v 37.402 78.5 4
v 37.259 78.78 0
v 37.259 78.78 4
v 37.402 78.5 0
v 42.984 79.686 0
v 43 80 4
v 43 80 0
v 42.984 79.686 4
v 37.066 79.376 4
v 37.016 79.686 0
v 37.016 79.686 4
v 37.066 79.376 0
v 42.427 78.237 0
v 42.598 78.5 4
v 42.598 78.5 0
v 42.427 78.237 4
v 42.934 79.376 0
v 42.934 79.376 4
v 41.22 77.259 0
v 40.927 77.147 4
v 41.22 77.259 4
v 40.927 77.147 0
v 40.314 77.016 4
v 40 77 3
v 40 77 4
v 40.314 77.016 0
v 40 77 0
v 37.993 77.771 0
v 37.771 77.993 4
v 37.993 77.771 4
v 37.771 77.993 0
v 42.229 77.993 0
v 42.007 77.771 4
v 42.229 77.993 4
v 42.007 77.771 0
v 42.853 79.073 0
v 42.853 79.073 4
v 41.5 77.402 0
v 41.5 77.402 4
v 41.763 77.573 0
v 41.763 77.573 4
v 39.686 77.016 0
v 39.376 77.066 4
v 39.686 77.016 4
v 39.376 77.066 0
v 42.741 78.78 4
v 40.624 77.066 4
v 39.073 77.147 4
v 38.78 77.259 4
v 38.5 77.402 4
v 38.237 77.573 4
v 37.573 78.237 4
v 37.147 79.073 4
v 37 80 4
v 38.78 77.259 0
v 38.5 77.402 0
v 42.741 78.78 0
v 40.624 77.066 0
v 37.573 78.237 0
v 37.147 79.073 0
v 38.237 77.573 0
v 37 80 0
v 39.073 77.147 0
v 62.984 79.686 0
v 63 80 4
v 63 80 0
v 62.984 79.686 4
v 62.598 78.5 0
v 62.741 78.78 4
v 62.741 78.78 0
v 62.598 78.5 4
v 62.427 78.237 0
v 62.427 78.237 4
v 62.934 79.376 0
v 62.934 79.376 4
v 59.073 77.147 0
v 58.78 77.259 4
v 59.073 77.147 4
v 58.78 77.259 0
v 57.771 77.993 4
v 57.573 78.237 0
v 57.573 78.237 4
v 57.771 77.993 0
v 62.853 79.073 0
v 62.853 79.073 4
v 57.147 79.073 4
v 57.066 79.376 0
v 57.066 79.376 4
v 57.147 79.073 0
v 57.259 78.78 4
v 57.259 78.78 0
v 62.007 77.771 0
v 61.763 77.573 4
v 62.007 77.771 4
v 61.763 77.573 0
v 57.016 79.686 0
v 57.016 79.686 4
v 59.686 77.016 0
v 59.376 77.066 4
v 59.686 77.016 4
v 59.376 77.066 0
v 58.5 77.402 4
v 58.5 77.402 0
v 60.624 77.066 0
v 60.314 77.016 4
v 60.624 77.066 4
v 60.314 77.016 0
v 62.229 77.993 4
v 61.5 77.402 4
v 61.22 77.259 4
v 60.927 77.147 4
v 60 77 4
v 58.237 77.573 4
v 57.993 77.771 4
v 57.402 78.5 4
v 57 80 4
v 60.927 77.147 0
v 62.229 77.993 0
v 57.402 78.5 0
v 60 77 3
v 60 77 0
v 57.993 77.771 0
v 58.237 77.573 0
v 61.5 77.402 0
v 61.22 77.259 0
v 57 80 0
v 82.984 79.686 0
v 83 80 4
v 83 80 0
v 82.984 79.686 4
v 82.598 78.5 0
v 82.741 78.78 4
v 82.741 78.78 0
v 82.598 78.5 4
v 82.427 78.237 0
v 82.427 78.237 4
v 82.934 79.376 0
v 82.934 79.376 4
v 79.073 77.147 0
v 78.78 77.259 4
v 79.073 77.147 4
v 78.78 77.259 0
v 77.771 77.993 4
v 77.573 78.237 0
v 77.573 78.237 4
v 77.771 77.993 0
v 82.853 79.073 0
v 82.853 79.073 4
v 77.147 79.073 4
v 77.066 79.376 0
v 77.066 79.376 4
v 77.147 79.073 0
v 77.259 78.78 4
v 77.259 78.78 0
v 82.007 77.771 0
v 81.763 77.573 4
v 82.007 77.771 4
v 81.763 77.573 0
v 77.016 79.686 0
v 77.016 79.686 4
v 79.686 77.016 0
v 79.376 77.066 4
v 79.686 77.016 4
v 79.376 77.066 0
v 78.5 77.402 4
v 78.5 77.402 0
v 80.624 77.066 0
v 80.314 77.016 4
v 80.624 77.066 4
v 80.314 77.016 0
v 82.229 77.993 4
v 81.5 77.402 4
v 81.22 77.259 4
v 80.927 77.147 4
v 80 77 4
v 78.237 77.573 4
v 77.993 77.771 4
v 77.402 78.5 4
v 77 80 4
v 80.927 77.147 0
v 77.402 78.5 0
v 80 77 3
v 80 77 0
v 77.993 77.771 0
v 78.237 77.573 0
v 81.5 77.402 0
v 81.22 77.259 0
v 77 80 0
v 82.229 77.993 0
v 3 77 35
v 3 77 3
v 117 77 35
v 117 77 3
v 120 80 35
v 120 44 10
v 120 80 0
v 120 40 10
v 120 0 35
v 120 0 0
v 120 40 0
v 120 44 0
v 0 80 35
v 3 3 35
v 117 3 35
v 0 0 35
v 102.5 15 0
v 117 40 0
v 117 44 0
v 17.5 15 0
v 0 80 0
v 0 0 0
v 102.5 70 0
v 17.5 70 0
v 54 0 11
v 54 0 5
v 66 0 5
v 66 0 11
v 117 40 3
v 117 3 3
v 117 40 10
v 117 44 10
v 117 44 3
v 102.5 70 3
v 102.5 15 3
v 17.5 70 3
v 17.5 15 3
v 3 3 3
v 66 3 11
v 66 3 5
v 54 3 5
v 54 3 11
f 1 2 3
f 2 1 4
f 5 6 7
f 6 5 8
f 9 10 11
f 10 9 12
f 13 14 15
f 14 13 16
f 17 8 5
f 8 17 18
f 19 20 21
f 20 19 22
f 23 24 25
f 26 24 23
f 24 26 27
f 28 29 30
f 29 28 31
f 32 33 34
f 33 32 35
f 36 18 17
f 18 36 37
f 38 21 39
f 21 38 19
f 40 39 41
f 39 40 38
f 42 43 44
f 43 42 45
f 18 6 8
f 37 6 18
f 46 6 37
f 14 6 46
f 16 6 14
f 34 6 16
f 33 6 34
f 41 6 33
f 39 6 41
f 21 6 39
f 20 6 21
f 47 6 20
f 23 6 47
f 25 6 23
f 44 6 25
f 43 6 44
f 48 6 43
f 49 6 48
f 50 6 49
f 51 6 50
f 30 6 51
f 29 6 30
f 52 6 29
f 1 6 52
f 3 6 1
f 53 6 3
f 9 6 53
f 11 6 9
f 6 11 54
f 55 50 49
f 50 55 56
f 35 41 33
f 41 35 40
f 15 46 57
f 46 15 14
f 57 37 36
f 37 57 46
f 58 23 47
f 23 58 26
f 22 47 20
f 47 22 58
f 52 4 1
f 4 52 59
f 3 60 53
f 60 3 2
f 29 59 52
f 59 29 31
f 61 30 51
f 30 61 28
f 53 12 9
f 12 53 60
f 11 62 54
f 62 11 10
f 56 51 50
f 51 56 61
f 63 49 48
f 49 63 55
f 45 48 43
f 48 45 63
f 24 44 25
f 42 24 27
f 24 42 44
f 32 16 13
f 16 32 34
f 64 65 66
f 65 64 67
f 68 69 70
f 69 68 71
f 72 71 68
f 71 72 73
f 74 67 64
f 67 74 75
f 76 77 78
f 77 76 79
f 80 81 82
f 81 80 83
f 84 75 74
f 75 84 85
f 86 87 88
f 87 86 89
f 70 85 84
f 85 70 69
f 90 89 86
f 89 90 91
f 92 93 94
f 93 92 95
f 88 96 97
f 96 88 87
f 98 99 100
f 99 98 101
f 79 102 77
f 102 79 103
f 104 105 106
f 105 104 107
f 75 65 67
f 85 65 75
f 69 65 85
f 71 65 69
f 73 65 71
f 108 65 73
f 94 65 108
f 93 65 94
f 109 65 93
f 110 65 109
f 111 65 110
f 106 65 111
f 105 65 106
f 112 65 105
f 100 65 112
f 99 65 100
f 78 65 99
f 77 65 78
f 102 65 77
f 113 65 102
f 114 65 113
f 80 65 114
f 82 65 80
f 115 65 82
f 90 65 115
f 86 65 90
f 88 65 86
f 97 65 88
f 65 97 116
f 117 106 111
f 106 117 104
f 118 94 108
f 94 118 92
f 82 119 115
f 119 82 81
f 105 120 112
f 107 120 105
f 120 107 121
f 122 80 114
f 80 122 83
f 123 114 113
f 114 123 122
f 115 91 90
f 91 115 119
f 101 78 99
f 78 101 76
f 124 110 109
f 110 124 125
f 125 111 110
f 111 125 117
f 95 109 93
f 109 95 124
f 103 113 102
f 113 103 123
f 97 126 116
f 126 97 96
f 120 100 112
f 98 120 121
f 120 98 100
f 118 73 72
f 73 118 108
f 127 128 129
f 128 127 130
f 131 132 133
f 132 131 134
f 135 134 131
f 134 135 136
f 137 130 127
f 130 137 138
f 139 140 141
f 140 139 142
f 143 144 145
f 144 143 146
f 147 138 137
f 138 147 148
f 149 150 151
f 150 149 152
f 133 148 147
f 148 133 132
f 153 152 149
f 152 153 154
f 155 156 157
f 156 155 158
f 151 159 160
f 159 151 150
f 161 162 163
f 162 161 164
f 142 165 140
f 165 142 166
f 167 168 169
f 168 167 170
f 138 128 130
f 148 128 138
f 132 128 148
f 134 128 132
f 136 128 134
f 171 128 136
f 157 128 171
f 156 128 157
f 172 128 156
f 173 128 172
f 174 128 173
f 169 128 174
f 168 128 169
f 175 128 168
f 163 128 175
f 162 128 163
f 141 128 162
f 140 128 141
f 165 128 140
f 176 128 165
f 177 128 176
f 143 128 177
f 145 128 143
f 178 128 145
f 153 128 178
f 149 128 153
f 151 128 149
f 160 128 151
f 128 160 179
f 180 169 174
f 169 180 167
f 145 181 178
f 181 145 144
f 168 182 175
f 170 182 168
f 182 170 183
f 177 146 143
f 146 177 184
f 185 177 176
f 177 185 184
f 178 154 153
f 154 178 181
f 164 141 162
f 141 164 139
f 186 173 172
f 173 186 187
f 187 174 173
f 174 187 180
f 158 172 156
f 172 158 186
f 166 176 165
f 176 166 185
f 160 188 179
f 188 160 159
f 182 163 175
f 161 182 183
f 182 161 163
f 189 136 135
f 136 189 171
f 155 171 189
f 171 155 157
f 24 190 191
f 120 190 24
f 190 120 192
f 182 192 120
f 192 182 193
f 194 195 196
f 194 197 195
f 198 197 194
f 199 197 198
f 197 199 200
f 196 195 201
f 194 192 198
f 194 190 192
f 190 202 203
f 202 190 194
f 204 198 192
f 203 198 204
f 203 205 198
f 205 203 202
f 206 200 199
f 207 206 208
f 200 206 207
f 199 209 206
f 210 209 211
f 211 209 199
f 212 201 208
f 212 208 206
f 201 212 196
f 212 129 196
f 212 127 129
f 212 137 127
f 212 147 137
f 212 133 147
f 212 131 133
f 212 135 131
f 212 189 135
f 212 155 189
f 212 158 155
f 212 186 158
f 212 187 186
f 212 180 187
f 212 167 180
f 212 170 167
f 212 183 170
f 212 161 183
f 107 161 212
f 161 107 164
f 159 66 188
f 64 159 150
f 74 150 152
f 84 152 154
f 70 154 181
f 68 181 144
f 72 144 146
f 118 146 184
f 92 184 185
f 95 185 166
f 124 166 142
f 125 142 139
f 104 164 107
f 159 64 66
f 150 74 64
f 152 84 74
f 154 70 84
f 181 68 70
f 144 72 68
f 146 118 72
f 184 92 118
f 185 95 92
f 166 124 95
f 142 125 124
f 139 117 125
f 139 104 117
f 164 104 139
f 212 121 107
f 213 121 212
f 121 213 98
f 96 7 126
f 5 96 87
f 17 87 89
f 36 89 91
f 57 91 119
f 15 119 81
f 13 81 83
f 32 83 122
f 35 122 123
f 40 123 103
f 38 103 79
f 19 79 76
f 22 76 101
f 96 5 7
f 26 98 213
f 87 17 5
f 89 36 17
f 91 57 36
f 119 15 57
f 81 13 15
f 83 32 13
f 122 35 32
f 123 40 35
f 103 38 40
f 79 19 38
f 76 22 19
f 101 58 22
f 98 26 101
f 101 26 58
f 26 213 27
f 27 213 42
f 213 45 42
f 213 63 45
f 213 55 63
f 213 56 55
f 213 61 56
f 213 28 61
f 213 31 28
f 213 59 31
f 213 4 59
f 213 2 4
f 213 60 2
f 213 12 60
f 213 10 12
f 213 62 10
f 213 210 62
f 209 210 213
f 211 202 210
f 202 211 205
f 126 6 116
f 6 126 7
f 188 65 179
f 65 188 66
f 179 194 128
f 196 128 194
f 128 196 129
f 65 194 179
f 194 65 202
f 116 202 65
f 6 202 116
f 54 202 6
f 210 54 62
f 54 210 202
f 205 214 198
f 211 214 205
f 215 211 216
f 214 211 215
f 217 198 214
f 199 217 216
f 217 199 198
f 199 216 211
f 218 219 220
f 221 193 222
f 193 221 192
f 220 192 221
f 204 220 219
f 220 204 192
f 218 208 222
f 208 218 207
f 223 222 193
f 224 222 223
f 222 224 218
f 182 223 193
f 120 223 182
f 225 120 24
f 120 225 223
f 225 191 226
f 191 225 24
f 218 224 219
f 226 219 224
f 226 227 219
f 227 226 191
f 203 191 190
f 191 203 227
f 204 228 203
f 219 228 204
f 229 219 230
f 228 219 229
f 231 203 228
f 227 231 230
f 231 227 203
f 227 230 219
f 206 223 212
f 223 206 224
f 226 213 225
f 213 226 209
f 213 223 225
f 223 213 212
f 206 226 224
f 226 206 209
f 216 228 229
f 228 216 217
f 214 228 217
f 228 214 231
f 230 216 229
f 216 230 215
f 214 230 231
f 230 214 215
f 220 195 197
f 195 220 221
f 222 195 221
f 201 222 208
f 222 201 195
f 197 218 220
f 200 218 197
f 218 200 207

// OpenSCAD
// Boîtier dépressiomètre ESP32 avec écran TFT 3.5", boutons, USB, SD et 4 capteurs en haut

$fn = 60;

// Dimensions générales
boitier_largeur = 120;
boitier_hauteur = 80;
boitier_profondeur = 35;

// Épaisseur des parois
epaisseur = 3;

// Découpe écran
ecran_largeur = 85;
ecran_hauteur = 55;
ecran_x = (boitier_largeur - ecran_largeur) / 2;
ecran_y = 15;

// Boutons sous l'écran
bouton_diametre = 6;
bouton_espacement = 20;
bouton_y = ecran_y + ecran_hauteur + 10;
bouton_x_start = (boitier_largeur - 2 * bouton_espacement) / 2;

// Fente USB en dessous
usb_largeur = 12;
usb_hauteur = 6;
usb_x = (boitier_largeur - usb_largeur) / 2;
usb_y = 5;

// Fente carte SD sur le côté droit
sd_largeur = 18;
sd_hauteur = 3;
sd_x = boitier_largeur - epaisseur;
sd_y = boitier_hauteur / 2;

// Trous capteurs sur le dessus
capteur_diametre = 8;
capteur_espacement = 20;
capteur_x_start = (boitier_largeur - 3 * capteur_espacement) / 2;
capteur_y = boitier_hauteur - epaisseur;

module boitier() {
    difference() {
        // Corps principal
        cube([boitier_largeur, boitier_hauteur, boitier_profondeur]);

        // Creux intérieur
        translate([epaisseur, epaisseur, epaisseur])
            cube([boitier_largeur - 2*epaisseur, boitier_hauteur - 2*epaisseur, boitier_profondeur - epaisseur]);

        // Découpe écran
        translate([ecran_x, ecran_y, -1])
            cube([ecran_largeur, ecran_hauteur, epaisseur + 2]);

        // Boutons
        for (i = [0:2]) {
            translate([bouton_x_start + i*bouton_espacement, bouton_y, -1])
                cylinder(h = epaisseur + 2, r = bouton_diametre/2);
        }

        // Fente USB
        translate([usb_x, 0, 5])
            cube([usb_largeur, epaisseur + 1, usb_hauteur]);

        // Fente carte SD
        translate([sd_x, sd_y, 10])
            rotate([0,90,0])
                cube([sd_largeur, epaisseur + 1, sd_hauteur]);

        // Trous capteurs sur le dessus
        for (i = [0:3]) {
            translate([capteur_x_start + i*capteur_espacement, capteur_y, boitier_profondeur - 5])
                rotate([90,0,0])
                    cylinder(h = epaisseur + 2, r = capteur_diametre/2);
        }
    }
}

boitier();
